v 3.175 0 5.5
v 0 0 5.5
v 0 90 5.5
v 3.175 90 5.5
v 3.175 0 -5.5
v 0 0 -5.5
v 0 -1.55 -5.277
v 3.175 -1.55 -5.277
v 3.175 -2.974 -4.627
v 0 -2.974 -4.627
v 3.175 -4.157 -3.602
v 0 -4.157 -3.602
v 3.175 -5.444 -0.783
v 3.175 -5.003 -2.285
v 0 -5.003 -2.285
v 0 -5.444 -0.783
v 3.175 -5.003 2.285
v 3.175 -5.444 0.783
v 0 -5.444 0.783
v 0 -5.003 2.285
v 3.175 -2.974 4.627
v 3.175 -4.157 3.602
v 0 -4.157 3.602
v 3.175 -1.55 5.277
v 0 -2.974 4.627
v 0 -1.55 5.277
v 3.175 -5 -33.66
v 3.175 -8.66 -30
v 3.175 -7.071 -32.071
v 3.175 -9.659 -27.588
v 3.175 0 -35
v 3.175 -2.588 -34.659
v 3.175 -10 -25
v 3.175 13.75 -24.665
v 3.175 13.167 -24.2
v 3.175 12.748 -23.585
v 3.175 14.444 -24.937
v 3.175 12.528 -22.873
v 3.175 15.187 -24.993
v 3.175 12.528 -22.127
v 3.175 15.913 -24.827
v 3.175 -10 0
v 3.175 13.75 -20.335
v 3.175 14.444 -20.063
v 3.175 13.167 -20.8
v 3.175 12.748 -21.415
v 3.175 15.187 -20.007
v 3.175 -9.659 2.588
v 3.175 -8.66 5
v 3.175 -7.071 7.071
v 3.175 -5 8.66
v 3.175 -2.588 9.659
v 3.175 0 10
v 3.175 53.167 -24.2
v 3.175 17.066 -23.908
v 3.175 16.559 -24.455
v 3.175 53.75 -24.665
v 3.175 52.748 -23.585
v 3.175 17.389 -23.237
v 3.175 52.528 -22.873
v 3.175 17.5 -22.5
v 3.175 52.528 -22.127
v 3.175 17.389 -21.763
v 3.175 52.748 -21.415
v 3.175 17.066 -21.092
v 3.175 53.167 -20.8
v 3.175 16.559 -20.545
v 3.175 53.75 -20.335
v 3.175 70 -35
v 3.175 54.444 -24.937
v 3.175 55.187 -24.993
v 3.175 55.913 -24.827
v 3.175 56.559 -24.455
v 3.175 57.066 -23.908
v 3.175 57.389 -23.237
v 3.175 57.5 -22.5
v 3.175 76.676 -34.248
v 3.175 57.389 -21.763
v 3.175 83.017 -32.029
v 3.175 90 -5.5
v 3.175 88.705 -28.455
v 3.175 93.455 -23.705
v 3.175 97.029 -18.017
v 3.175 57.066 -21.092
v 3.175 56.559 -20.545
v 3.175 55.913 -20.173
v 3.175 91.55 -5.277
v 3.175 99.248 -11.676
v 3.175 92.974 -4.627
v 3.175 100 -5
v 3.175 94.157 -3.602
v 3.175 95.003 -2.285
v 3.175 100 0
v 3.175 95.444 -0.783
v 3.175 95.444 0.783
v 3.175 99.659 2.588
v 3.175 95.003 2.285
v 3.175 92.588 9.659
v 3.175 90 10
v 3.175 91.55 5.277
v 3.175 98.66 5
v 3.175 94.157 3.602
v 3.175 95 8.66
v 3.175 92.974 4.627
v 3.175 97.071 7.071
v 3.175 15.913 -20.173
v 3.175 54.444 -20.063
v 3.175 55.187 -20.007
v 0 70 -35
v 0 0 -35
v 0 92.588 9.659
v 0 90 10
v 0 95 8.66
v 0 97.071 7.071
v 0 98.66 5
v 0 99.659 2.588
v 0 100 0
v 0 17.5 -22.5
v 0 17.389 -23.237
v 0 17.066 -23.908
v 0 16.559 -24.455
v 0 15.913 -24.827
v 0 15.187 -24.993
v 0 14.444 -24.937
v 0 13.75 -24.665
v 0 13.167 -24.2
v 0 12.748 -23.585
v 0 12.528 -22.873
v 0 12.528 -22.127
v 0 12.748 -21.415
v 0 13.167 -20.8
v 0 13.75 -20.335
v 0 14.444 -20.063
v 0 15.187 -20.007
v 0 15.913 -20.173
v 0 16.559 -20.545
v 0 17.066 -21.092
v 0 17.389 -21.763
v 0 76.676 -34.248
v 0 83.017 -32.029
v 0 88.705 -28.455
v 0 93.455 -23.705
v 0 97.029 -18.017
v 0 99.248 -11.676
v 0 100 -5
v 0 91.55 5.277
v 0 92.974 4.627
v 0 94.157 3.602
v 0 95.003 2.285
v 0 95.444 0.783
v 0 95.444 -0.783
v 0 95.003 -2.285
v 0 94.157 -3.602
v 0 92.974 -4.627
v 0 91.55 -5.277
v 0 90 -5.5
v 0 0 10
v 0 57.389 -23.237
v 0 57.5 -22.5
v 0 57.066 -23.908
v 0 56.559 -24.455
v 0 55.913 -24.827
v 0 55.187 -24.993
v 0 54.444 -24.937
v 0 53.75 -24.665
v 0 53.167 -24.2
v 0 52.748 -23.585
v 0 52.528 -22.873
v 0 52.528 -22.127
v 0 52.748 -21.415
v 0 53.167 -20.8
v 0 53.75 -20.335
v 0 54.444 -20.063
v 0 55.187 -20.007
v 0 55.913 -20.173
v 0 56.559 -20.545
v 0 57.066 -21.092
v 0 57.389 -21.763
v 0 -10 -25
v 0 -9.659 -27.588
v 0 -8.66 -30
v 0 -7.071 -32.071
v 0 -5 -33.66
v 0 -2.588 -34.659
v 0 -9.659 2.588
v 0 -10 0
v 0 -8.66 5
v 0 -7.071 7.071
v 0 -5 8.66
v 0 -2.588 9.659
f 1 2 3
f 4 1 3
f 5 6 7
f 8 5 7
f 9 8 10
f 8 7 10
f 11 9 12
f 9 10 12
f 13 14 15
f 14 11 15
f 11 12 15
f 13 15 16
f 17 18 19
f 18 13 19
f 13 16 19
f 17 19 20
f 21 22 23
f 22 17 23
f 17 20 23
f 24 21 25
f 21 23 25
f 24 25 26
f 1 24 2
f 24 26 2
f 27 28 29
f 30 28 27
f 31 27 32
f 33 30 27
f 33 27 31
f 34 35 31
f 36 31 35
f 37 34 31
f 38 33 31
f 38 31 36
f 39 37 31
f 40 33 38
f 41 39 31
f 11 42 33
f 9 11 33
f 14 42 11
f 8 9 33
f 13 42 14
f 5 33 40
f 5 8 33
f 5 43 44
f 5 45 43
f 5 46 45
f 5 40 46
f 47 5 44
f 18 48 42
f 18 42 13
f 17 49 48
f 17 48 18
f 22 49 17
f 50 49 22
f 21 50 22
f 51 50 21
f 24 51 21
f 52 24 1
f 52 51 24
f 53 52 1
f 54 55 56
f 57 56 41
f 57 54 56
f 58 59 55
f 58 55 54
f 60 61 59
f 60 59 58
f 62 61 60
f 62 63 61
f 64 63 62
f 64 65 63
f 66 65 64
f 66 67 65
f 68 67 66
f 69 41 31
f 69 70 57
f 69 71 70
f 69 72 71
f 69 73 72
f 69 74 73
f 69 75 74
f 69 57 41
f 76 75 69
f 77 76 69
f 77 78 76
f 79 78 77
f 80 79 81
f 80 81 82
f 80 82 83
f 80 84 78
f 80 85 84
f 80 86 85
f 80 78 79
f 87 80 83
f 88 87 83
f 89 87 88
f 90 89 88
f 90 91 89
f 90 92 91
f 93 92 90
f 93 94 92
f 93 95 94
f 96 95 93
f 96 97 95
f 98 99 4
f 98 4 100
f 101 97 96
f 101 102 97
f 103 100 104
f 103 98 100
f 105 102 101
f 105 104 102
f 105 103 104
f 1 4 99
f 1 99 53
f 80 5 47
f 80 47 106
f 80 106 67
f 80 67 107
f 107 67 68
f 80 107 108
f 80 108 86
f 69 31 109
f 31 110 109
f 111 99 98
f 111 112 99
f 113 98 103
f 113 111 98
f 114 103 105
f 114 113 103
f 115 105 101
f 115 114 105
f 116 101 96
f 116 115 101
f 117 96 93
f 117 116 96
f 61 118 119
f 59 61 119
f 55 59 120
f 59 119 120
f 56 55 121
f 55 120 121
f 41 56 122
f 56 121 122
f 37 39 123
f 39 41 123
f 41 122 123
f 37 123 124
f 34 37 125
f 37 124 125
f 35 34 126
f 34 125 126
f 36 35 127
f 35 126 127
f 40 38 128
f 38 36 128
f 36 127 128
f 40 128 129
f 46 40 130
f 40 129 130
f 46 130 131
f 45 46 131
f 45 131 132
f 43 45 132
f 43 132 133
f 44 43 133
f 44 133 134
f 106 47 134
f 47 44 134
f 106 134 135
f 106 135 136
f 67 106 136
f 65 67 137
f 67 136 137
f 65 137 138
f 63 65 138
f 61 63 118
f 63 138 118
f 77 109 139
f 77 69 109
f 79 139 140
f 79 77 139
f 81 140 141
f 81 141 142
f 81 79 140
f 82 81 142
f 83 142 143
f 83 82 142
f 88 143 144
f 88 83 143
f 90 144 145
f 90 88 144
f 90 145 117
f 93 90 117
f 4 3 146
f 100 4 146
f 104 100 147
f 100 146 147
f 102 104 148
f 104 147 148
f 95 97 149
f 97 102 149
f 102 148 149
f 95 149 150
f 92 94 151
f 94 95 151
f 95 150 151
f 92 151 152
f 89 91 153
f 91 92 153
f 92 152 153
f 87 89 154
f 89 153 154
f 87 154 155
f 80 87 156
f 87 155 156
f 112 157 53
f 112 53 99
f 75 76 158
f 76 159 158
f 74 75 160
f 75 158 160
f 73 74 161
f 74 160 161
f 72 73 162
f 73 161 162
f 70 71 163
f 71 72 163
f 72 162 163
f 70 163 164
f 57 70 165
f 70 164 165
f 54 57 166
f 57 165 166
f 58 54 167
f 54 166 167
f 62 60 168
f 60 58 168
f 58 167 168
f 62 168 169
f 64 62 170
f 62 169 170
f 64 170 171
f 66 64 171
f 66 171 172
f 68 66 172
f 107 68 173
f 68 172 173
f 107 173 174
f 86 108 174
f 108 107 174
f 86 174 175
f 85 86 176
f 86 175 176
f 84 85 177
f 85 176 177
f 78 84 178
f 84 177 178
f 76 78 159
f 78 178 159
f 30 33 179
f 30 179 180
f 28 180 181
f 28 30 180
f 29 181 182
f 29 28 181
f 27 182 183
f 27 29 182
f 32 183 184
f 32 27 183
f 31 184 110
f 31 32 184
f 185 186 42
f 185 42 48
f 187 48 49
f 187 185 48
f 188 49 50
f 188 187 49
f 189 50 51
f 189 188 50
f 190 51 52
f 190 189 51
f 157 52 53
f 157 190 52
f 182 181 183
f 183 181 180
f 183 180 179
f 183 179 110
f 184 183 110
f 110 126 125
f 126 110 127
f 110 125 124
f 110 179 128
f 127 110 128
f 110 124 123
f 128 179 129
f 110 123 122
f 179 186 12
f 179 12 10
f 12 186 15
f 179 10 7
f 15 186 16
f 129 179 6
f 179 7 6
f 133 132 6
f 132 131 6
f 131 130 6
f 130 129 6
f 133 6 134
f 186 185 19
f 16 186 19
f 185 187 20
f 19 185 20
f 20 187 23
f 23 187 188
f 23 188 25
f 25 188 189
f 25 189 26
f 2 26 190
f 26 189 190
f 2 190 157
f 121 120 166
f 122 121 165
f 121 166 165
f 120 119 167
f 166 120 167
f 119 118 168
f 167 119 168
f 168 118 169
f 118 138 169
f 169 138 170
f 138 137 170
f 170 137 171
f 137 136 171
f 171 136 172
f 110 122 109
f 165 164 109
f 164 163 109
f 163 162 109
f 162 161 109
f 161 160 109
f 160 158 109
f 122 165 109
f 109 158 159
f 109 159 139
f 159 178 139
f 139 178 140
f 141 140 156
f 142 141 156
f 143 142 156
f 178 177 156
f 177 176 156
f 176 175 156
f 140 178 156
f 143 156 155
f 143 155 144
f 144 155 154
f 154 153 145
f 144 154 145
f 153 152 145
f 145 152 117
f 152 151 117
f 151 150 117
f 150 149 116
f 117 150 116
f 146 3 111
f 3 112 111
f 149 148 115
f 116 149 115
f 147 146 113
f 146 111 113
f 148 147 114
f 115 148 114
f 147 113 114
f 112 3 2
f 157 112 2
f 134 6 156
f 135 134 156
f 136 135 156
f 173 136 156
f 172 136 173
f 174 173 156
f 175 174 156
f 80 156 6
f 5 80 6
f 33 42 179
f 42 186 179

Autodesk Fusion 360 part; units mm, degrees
sketch "Sketch1" plane through (0, 0, 0) normal (1, 0, 0) x (0, 1, 0)
  line L0 (-10, 0) -> (-10, -35)
  line L1 (-10, -35) -> (100, -35)
  line L2 (100, -35) -> (100, 0)
  line L3 (0, 10) -> (90, 10)
  line L4 (0, 5.5) -> (90, 5.5)
  line L5 (90, -5.5) -> (0, -5.5)
  arc A0 (0, 10) -> (-10, 0) centre (0, 0) ccw
  arc A1 (0, 5.5) -> (0, -5.5) centre (0, 0) ccw
  arc A2 (100, 0) -> (90, 10) centre (90, 0) ccw
  arc A3 (90, -5.5) -> (90, 5.5) centre (90, 0) ccw
  line L6 (-10, -35) -> (-10, -22.5) construction
  line L7 (-10, -22.5) -> (100, -22.5) construction
  line L8 (45, -22.5) -> (45, -35) construction
  circle A4 centre (15, -22.5) radius 2.5
  circle A5 centre (55, -22.5) radius 2.5
  dimension "d1" = 11
  dimension "d2" = 20
  dimension "d3" = 11
  dimension "d4" = 20
  dimension "d5" = 90
  dimension "d7" = 35
  dimension "d10" = 12.5
  dimension "d11" = 5
  dimension "d12" = 5
  dimension "d16" = 30
  dimension "d17" = 10
extrude "Extrude1" add sketch "Sketch1" along normal blind 3.175
fillet "Fillet1" radius 10 1 edges at (1.5875, -10, -35)
fillet "Fillet2" radius 30 1 edges at (1.5875, 100, -35)
